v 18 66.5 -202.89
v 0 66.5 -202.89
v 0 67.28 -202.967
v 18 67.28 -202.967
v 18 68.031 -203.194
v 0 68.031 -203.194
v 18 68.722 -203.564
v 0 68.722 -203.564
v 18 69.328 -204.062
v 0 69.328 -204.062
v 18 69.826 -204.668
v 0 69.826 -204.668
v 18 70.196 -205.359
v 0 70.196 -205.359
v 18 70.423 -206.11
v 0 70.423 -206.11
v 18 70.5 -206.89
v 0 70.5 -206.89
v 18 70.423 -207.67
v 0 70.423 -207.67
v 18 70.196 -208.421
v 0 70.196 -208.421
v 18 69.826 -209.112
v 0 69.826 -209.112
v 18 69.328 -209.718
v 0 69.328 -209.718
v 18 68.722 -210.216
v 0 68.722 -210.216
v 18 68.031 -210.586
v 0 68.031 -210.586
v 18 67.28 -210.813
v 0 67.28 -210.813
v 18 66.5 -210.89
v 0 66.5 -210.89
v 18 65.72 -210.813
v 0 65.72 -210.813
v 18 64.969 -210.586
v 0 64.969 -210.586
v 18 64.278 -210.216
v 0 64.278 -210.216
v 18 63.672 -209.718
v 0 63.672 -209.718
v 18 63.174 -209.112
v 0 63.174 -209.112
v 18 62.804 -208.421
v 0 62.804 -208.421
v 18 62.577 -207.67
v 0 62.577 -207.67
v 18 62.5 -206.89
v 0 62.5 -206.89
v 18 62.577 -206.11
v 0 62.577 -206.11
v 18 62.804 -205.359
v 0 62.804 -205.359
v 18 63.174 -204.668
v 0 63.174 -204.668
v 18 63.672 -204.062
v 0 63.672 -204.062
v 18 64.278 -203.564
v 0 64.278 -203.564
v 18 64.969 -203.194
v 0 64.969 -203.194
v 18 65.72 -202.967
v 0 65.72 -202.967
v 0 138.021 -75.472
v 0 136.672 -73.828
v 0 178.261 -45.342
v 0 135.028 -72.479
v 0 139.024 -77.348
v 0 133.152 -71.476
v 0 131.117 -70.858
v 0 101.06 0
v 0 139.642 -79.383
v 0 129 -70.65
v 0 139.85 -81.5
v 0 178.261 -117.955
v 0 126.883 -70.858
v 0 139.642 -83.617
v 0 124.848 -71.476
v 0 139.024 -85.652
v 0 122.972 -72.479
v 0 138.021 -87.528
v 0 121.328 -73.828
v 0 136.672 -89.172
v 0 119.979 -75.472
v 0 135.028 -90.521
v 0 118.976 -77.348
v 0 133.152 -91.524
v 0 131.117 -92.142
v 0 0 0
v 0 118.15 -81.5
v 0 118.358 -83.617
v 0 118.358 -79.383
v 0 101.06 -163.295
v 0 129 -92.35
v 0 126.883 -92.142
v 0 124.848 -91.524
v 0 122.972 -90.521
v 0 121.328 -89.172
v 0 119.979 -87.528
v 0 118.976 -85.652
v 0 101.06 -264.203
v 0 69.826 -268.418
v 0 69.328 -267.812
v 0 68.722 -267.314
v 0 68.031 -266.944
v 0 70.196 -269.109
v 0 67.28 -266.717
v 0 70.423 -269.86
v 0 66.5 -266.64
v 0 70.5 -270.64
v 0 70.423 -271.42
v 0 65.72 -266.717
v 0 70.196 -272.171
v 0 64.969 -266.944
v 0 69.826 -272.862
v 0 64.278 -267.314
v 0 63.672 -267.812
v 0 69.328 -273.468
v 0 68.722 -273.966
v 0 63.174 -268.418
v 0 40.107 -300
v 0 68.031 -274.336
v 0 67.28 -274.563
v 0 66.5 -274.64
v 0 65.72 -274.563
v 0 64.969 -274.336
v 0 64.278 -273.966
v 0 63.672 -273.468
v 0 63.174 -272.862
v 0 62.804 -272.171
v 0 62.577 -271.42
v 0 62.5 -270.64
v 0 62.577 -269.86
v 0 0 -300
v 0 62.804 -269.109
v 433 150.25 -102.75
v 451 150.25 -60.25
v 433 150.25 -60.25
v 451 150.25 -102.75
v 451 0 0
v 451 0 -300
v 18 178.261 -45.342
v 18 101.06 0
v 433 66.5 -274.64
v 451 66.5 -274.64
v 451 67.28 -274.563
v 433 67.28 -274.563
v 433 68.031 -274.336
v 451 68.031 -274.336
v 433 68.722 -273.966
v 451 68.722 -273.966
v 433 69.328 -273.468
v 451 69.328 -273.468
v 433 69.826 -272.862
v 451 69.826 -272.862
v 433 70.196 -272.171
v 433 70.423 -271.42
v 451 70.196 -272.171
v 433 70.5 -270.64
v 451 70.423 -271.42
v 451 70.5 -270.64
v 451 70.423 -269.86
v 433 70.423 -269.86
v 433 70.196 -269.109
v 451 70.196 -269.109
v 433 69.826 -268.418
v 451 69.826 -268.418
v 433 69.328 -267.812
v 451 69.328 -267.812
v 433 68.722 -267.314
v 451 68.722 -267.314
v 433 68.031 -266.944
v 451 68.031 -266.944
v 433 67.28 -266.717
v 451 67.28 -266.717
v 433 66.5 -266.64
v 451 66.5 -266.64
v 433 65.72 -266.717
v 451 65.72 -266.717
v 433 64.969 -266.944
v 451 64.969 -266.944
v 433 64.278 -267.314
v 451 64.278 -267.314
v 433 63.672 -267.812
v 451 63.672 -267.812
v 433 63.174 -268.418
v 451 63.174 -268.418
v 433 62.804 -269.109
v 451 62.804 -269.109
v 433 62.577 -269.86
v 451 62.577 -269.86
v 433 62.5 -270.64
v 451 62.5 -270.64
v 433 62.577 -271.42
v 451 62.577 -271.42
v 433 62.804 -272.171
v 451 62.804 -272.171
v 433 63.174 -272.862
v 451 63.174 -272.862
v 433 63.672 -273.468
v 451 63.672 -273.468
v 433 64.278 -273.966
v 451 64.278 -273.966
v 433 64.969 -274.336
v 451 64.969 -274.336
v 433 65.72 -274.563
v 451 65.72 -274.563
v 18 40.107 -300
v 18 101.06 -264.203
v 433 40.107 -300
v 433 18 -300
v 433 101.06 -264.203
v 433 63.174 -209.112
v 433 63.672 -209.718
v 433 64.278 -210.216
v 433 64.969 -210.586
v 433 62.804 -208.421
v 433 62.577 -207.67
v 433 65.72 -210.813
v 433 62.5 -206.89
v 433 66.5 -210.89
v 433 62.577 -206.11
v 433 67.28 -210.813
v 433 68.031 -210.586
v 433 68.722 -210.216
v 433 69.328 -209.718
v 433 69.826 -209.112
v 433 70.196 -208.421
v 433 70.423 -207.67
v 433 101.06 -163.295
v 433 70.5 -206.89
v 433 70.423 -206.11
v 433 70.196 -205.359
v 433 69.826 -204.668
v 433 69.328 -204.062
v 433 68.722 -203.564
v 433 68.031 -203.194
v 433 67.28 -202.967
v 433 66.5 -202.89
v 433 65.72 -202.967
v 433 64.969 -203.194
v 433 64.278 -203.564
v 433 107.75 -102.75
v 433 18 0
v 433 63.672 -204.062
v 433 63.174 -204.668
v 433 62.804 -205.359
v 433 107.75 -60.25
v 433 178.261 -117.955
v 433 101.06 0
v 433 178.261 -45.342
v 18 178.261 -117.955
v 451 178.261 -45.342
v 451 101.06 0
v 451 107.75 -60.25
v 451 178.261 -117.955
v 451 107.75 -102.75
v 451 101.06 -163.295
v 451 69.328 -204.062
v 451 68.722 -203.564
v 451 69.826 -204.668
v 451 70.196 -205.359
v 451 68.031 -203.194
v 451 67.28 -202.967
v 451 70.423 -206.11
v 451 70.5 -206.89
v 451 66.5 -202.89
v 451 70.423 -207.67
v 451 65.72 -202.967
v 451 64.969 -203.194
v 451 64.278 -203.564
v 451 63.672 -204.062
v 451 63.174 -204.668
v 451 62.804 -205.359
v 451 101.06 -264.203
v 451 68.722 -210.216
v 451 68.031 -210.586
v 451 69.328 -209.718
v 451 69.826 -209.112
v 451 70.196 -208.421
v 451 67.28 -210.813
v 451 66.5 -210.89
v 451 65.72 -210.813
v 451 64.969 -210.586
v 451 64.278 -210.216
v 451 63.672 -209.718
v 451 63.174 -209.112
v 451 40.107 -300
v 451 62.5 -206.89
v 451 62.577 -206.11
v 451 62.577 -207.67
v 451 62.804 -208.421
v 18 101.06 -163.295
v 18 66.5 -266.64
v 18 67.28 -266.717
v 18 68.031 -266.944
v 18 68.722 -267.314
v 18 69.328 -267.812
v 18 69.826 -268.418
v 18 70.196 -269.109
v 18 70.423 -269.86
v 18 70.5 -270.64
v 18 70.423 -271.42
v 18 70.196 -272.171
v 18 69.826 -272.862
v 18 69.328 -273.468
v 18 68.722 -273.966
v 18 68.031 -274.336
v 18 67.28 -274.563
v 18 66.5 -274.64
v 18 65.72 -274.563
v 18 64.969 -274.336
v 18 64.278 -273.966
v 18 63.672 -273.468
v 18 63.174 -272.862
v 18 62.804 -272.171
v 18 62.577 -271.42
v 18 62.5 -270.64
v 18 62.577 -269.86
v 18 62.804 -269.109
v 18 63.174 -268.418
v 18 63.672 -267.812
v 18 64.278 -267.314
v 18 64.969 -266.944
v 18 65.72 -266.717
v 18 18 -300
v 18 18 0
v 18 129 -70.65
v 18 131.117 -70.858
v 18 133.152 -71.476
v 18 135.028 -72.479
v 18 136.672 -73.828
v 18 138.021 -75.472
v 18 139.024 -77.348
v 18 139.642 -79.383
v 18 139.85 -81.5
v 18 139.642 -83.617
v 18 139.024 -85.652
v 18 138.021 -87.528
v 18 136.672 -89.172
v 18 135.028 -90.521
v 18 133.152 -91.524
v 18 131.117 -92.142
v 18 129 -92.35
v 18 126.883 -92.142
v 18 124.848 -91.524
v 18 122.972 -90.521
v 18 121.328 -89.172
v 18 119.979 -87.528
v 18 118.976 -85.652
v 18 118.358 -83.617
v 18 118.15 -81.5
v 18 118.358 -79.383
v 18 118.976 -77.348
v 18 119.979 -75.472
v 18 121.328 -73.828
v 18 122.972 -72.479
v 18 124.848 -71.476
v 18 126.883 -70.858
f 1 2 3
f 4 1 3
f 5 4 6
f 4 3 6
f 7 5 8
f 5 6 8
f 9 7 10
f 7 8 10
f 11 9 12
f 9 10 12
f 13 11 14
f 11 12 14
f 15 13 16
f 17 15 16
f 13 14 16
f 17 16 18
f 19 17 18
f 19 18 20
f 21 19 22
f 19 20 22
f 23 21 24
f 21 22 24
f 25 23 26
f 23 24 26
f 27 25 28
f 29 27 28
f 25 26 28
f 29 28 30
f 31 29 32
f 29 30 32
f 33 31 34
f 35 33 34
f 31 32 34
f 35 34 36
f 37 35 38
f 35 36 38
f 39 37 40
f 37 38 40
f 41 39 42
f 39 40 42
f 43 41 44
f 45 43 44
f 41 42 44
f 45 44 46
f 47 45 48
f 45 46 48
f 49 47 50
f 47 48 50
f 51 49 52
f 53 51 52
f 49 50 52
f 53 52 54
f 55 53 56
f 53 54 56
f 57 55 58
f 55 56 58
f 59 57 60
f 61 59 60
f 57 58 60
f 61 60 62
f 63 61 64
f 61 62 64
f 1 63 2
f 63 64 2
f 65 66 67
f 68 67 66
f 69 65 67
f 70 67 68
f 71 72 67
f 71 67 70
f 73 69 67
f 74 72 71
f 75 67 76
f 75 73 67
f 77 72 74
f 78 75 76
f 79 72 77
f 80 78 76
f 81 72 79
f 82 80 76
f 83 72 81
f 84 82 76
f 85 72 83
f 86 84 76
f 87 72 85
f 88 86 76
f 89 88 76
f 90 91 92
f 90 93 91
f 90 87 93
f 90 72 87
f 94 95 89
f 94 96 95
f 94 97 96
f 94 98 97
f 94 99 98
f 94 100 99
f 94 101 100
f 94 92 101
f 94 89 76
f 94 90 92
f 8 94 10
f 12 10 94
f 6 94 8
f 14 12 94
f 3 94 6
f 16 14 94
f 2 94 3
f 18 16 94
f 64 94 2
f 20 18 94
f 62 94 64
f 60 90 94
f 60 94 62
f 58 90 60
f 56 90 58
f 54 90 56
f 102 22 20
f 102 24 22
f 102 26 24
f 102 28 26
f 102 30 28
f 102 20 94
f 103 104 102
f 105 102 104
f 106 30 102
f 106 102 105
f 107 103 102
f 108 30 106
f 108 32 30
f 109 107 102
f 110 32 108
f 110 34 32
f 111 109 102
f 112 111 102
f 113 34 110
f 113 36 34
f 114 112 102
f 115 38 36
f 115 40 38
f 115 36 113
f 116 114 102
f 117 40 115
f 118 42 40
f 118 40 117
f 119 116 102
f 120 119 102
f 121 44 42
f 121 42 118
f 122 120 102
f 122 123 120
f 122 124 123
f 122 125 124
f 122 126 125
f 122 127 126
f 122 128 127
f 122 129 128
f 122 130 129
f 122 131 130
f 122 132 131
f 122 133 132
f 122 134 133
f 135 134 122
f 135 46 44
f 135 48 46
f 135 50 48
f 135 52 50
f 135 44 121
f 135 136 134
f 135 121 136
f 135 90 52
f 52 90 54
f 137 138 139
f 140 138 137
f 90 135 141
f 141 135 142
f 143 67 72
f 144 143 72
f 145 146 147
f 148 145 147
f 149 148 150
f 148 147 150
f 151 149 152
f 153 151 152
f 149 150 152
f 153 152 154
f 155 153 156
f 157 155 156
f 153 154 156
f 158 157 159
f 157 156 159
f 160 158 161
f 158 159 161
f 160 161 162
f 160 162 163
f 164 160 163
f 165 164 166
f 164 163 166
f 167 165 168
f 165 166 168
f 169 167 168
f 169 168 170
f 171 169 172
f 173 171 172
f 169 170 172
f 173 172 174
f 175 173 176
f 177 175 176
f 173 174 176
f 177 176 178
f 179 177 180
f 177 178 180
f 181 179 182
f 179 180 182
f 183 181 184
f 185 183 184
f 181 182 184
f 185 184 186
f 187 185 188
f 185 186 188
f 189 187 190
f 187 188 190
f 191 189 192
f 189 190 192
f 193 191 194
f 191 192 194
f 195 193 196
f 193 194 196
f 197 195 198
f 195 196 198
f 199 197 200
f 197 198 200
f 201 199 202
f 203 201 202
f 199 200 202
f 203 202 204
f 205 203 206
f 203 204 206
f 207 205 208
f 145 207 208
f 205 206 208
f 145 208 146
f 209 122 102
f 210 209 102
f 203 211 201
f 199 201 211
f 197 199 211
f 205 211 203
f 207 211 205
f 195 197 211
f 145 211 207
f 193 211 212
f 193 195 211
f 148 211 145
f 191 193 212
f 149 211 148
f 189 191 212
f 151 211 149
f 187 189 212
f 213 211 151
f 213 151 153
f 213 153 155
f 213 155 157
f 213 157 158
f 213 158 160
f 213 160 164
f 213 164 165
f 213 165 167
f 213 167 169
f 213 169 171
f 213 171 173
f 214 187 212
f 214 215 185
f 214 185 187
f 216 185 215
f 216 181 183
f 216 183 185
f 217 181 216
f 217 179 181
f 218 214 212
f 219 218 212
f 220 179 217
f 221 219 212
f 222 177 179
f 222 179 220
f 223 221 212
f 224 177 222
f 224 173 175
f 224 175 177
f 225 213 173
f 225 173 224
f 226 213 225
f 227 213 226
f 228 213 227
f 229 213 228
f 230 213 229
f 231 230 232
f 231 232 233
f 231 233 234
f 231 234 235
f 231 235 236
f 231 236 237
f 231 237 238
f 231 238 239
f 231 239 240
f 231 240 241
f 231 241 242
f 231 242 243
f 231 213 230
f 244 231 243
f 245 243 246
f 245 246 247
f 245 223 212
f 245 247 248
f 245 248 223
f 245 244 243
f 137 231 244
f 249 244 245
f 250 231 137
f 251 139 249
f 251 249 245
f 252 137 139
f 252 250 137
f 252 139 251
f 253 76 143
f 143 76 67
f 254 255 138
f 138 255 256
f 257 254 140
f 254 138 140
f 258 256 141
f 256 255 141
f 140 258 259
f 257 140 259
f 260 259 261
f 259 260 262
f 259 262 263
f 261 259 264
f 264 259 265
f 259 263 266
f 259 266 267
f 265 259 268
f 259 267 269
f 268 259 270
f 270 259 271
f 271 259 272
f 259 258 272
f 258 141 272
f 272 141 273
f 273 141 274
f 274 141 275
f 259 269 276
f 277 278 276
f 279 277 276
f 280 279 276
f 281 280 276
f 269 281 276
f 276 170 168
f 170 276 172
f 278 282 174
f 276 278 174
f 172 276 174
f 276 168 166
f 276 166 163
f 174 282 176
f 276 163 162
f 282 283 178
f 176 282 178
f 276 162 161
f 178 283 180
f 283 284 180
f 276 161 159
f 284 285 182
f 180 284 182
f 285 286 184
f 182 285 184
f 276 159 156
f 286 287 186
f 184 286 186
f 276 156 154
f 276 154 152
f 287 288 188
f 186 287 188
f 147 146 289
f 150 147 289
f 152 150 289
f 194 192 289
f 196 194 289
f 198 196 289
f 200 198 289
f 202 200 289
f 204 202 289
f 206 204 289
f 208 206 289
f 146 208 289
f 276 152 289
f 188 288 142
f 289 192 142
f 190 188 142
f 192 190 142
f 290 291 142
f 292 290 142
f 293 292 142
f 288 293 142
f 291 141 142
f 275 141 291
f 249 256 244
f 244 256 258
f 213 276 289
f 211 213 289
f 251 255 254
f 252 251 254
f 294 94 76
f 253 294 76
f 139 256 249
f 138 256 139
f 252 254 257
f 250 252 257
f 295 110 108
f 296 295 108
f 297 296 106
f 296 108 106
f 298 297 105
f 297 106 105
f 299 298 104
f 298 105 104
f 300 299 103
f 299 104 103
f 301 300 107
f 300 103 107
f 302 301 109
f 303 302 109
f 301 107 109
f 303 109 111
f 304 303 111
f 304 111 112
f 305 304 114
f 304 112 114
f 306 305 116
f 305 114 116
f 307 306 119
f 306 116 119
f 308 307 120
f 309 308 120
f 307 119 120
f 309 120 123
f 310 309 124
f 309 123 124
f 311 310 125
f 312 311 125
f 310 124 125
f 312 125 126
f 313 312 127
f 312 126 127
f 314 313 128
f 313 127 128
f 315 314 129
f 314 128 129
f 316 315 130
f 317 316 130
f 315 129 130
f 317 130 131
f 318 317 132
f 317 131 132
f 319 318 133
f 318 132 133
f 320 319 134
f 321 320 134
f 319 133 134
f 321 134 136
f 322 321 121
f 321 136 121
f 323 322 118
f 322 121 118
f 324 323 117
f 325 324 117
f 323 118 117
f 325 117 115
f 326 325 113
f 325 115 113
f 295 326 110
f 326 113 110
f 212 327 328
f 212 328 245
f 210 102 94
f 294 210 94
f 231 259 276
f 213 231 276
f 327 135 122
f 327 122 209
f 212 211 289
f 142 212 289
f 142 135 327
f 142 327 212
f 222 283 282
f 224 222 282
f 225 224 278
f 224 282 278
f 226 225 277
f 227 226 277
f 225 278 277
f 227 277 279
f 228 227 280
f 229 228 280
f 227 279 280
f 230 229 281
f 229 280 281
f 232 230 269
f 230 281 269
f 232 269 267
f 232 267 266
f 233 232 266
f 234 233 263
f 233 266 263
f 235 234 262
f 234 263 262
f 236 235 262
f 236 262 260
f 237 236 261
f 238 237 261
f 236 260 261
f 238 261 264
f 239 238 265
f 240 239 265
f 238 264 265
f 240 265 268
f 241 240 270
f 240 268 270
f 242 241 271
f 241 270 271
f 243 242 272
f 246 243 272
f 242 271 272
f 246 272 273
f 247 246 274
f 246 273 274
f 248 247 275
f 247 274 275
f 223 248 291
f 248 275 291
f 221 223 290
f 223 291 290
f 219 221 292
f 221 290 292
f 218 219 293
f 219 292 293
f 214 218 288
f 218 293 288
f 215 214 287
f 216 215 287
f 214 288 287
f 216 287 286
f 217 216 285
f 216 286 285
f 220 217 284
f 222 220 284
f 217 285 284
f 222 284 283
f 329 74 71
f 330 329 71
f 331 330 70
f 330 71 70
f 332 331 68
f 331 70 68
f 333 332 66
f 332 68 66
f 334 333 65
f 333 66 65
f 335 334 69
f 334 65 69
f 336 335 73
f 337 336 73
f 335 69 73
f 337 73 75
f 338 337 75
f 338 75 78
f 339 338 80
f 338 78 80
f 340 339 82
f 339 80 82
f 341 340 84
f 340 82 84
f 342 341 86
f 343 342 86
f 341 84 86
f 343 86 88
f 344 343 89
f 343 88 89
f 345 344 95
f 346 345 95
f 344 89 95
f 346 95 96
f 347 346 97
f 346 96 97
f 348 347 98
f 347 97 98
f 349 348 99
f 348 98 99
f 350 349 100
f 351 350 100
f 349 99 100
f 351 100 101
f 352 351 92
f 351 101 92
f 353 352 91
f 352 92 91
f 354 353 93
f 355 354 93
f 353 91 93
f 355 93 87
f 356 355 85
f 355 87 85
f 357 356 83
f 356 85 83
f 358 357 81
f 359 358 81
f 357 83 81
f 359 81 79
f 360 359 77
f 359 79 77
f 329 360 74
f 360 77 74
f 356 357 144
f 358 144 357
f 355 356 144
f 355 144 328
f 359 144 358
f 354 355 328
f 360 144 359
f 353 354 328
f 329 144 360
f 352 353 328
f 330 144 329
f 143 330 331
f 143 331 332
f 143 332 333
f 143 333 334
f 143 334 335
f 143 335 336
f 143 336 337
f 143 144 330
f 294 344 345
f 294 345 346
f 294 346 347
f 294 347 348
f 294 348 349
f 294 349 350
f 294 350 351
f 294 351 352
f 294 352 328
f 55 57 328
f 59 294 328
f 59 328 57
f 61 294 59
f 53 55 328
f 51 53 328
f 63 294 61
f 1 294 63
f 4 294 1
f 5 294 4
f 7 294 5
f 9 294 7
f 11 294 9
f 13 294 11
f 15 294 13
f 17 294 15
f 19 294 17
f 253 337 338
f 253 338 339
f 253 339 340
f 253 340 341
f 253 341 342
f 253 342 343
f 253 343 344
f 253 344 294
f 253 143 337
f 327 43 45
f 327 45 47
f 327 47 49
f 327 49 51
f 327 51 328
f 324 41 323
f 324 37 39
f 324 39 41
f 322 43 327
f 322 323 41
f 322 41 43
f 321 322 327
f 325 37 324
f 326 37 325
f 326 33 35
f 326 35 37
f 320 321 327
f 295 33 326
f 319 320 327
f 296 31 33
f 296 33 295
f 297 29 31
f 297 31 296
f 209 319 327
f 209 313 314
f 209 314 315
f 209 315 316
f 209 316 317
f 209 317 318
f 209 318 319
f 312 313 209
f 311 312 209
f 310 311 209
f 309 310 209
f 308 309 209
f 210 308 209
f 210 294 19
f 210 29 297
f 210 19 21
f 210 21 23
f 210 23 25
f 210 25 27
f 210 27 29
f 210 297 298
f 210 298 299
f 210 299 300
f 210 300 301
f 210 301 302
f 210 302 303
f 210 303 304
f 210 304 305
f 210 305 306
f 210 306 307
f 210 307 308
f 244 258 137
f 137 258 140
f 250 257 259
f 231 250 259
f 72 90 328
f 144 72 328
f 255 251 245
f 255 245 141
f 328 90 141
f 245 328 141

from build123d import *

# Parameters (mm, degrees)
SKETCH1_W           = 451
SKETCH1_H           = 300
BOSS_EXTRUDE6_DEPTH = 18
SKETCH4_R           = 4
SKETCH4_W           = 42.5
SKETCH4_H           = 42.5
BOSS_EXTRUDE7_DEPTH = 18
SKETCH5_R           = 10.85
SKETCH5_R_2         = 4
BOSS_EXTRUDE8_DEPTH = 18


with BuildPart() as part:
    # Sketch1 → Boss-Extrude6 (new body)
    with BuildSketch(Plane(origin=(0, 0, 0), x_dir=(1, 0, 0), z_dir=(0, 1, 0))):
        with Locations((225.5, 150)):
            Rectangle(SKETCH1_W, SKETCH1_H)
    extrude(amount=BOSS_EXTRUDE6_DEPTH)

    # Sketch4 → Boss-Extrude7 (add)
    with BuildSketch(Plane(origin=(451, 0, 0), x_dir=(0, 0, -1), z_dir=(1, 0, 0))):
        Polygon((0, 0), (0, 101.059625538), (45.34233012, 178.261418028), (117.954980558, 178.261418028), (163.295274024, 101.059625538), (264.202994821, 101.059625538), (300, 40.107374144), (300, 0), align=None)
        with Locations((206.89, 66.5)):
            Circle(SKETCH4_R, mode=Mode.SUBTRACT)
        with Locations((270.64, 66.5)):
            Circle(SKETCH4_R, mode=Mode.SUBTRACT)
        with Locations((81.5, 129)):
            Rectangle(SKETCH4_W, SKETCH4_H, mode=Mode.SUBTRACT)
    extrude(amount=-BOSS_EXTRUDE7_DEPTH)

    # Sketch5 → Boss-Extrude8 (add)
    with BuildSketch(Plane.ZY):
        Polygon((-300, 0), (-300, 40.107374144), (-264.202994821, 101.059625538), (-163.295274024, 101.059625538), (-117.954980558, 178.261418028), (-45.34233012, 178.261418028), (0, 101.059625538), (0, 0), align=None)
        with Locations((-81.5, 129)):
            Circle(SKETCH5_R, mode=Mode.SUBTRACT)
        with Locations((-270.64, 66.5)):
            Circle(SKETCH5_R_2, mode=Mode.SUBTRACT)
        with Locations((-206.89, 66.5)):
            Circle(SKETCH5_R_2, mode=Mode.SUBTRACT)
    extrude(amount=-BOSS_EXTRUDE8_DEPTH)


solid = part.part
